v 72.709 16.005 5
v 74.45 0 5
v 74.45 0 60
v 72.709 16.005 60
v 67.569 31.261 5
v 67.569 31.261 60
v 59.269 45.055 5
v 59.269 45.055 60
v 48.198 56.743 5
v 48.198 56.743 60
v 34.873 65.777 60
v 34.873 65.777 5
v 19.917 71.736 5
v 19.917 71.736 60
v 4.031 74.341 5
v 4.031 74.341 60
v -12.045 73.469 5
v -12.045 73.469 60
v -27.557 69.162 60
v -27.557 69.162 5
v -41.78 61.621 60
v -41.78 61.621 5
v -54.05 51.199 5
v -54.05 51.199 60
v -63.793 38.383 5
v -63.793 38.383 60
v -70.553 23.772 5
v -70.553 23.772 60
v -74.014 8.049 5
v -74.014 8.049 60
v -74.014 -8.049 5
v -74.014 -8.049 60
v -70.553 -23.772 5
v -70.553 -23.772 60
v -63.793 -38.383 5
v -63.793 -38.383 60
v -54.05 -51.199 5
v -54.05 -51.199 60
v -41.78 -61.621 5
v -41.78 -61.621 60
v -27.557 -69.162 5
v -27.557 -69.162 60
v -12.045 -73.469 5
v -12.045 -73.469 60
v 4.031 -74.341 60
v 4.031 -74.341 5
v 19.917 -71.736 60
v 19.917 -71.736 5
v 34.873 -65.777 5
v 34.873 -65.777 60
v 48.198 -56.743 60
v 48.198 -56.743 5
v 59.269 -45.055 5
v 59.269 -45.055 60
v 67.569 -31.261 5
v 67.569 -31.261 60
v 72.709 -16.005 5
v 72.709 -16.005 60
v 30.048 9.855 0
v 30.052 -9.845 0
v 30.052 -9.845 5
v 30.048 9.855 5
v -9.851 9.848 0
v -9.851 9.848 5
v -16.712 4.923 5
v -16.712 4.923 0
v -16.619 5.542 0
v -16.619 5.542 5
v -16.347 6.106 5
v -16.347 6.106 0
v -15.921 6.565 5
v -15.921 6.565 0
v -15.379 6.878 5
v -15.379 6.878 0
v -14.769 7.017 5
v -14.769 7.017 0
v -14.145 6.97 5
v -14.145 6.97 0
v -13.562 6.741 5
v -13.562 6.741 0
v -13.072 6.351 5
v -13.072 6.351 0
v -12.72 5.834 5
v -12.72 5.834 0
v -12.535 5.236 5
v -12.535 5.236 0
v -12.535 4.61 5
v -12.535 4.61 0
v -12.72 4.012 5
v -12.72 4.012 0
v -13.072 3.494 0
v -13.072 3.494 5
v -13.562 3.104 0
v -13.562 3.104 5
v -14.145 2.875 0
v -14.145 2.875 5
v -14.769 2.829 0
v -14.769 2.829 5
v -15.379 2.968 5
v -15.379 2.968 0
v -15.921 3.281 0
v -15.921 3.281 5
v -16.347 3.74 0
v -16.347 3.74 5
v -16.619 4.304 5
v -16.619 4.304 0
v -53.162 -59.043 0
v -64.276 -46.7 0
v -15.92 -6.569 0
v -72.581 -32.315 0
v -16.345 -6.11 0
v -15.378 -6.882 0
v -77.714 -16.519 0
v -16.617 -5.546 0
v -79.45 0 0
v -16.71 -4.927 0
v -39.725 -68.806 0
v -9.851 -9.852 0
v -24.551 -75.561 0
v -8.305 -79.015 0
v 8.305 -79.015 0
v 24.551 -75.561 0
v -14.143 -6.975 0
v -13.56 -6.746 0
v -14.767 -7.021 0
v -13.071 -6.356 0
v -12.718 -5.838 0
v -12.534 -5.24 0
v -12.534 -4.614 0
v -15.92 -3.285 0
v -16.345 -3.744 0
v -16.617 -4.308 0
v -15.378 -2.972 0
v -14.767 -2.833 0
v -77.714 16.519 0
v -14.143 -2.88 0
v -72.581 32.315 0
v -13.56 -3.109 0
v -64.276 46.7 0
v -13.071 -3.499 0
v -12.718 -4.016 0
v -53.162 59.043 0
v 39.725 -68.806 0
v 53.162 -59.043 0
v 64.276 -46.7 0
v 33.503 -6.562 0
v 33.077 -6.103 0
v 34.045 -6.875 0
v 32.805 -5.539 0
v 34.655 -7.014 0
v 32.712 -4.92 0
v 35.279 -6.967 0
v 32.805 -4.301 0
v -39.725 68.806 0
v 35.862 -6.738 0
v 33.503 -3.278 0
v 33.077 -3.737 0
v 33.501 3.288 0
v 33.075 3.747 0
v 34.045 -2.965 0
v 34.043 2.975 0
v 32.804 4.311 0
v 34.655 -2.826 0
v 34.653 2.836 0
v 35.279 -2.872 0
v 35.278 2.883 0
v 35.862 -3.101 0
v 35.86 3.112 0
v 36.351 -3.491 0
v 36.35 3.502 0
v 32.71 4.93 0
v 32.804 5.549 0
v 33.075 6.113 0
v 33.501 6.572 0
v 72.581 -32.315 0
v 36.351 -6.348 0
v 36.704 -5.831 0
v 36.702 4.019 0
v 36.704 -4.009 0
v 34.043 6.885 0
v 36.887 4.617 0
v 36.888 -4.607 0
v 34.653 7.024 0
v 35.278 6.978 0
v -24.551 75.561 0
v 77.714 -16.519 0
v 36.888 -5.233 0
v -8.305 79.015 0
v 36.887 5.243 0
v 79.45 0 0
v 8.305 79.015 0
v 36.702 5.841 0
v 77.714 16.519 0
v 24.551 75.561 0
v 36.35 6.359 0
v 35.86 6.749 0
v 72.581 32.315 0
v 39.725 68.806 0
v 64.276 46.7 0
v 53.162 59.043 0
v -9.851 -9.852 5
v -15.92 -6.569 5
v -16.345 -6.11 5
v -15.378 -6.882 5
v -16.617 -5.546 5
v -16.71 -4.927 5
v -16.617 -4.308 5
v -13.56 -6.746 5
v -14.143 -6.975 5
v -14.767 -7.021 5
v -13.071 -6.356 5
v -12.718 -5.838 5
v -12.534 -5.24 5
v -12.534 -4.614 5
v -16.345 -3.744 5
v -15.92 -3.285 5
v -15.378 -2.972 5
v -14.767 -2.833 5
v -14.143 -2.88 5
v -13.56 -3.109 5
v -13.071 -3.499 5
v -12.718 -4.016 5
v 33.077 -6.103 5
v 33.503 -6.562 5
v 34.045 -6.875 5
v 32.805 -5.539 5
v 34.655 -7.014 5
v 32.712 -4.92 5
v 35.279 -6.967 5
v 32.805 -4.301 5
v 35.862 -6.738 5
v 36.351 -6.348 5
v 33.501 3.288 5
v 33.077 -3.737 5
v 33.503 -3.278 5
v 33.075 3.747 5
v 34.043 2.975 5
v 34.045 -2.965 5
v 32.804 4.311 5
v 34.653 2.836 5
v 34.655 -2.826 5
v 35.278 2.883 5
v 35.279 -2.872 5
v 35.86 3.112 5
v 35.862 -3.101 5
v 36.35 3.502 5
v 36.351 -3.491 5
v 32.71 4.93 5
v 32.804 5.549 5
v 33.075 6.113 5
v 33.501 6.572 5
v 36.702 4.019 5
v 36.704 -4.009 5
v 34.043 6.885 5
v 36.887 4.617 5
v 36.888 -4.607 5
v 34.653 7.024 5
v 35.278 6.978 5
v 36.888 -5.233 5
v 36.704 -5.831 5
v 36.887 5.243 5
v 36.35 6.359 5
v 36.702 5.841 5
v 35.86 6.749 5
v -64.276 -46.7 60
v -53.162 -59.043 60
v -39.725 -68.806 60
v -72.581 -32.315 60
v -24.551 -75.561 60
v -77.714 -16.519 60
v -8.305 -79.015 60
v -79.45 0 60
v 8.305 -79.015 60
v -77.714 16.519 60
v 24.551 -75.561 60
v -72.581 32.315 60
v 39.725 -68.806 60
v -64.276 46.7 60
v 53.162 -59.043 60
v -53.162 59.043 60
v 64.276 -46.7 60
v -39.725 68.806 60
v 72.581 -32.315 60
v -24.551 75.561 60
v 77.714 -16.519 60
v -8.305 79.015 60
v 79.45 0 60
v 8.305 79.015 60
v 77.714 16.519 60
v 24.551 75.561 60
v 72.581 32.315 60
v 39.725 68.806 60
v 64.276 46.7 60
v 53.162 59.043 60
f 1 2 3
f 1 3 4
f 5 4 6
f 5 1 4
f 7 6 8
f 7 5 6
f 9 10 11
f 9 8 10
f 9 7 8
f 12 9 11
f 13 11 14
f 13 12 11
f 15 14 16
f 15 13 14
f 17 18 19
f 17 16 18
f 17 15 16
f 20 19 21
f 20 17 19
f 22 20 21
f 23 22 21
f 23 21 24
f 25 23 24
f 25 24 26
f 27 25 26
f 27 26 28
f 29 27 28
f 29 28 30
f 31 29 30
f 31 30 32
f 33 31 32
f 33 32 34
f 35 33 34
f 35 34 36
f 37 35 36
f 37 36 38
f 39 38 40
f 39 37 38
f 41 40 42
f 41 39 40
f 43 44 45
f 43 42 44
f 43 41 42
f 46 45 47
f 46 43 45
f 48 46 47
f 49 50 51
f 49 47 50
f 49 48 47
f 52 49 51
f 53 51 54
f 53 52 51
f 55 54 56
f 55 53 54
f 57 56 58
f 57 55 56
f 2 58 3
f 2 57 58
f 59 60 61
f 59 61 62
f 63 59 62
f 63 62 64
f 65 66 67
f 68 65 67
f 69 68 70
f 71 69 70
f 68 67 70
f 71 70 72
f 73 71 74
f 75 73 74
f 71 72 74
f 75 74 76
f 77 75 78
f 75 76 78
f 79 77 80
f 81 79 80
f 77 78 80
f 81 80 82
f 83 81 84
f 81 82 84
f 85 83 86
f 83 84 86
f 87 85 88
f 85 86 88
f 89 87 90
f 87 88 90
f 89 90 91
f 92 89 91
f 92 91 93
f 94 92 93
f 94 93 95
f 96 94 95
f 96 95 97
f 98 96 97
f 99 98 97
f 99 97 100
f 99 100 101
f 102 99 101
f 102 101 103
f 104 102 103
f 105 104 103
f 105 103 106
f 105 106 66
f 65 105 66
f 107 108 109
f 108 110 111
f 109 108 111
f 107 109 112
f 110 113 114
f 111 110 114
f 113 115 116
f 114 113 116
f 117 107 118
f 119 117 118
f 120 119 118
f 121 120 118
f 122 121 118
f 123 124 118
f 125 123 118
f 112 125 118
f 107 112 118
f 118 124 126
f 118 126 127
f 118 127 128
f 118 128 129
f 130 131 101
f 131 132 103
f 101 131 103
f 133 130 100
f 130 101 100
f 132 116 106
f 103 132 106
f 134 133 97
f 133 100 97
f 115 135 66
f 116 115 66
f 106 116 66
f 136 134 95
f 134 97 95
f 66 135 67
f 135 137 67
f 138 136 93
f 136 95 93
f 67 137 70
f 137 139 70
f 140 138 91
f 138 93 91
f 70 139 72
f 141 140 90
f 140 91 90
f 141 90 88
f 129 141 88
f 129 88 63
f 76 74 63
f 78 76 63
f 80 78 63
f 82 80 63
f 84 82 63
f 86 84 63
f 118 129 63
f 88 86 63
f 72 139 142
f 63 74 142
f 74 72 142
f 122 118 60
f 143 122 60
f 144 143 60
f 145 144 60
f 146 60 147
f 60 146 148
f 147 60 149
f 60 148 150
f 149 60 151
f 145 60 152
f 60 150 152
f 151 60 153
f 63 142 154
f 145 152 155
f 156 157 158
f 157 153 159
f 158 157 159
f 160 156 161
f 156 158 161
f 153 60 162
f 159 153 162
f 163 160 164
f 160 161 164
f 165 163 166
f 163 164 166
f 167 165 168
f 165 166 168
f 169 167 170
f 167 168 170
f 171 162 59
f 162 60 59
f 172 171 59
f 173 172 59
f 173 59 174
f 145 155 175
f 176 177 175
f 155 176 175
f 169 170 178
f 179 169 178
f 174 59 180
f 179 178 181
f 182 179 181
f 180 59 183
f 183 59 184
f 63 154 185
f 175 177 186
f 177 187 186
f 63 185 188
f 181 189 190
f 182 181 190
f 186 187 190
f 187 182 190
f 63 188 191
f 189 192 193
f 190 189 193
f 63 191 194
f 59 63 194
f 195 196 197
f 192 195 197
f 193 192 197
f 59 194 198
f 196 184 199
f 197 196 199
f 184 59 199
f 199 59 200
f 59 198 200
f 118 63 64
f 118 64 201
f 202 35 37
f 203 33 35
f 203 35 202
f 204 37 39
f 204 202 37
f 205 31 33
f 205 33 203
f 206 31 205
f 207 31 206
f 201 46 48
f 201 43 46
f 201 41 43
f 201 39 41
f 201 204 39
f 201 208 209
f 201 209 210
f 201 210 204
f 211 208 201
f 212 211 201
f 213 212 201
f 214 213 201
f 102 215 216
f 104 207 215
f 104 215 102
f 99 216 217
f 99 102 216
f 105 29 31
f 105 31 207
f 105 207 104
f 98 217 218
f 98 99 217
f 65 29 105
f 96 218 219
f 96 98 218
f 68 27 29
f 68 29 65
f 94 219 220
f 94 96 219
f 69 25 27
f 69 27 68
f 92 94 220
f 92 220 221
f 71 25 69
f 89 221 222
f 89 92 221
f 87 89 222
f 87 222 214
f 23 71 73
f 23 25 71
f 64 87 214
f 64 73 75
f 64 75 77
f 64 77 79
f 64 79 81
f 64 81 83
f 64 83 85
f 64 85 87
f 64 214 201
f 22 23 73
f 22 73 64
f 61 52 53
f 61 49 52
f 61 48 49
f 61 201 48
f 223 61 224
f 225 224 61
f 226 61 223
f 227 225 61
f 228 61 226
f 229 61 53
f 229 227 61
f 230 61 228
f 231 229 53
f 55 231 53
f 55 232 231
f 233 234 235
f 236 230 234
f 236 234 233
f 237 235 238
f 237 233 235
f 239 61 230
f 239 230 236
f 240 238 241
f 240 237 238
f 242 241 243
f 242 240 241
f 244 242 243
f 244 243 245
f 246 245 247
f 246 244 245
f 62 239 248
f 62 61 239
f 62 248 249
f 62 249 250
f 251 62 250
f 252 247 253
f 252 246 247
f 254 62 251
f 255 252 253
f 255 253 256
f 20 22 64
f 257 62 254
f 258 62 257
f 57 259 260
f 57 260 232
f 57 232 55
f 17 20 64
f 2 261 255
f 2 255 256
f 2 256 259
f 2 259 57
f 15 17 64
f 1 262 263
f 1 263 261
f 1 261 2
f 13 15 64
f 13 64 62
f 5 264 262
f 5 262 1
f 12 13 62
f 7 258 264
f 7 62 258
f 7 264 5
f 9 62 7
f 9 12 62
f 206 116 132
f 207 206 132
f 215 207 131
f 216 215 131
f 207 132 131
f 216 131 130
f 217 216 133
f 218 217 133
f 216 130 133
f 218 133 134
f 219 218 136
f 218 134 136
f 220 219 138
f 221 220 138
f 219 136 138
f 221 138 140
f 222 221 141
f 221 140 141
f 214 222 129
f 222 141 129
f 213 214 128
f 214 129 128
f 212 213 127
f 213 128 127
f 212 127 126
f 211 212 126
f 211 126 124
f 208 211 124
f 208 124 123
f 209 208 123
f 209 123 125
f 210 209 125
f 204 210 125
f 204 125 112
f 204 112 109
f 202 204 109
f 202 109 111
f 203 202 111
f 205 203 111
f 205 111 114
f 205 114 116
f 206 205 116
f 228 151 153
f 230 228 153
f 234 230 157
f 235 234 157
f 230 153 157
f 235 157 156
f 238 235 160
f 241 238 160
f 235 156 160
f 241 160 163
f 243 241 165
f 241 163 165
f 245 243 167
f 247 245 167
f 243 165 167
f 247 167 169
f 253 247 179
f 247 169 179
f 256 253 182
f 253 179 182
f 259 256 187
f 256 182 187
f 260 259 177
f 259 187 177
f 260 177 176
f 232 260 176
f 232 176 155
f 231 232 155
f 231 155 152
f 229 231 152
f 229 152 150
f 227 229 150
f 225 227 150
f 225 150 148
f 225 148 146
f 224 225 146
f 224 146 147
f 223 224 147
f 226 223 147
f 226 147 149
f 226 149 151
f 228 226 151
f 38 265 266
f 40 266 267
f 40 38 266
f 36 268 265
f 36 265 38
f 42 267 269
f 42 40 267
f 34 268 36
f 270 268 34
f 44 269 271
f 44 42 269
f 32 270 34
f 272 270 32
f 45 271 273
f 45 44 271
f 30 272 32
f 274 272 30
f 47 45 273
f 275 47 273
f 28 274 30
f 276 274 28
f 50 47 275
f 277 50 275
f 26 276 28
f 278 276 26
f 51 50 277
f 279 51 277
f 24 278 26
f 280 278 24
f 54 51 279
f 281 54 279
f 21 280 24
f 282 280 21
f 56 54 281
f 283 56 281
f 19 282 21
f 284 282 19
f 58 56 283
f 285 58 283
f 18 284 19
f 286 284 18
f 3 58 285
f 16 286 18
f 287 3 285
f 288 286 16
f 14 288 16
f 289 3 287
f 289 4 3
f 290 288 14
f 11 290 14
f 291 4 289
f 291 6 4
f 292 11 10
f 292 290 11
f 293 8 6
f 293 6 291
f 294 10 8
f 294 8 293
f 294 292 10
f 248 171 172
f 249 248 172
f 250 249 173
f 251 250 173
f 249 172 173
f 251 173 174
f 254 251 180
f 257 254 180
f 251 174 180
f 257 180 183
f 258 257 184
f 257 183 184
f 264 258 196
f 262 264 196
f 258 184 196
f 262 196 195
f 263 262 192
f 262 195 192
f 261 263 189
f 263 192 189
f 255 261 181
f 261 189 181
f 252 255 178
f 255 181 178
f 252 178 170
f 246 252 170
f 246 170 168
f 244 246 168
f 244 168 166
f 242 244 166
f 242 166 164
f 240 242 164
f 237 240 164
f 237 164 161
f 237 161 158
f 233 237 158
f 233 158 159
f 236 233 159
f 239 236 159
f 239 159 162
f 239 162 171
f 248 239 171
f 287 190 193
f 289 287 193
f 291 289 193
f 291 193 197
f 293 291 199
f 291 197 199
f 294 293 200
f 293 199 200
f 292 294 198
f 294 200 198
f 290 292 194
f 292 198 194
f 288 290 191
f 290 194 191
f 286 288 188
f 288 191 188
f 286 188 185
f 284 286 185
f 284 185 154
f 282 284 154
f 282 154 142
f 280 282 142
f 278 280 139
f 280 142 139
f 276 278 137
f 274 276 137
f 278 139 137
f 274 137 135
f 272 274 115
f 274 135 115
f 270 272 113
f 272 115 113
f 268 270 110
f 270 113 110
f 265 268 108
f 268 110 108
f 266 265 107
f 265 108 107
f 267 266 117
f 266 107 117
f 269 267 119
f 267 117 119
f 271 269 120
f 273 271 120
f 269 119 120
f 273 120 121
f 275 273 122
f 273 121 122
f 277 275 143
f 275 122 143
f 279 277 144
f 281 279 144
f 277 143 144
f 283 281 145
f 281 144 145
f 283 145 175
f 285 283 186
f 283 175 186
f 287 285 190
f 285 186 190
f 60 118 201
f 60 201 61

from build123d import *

# Parameters (mm, degrees)
SKETCH1_R           = 79.45
BOSS_EXTRUDE1_DEPTH = 60
SHELL1_T            = -5
SKETCH2_R           = 2.5
CUT_EXTRUDE1_DEPTH  = 60
SKETCH3_R           = 2.1
CUT_EXTRUDE2_DEPTH  = 60


with BuildPart() as part:
    # Sketch1 → Boss-Extrude1 (new body)
    with BuildSketch(Plane.XY):
        Circle(SKETCH1_R)
    extrude(amount=BOSS_EXTRUDE1_DEPTH)

    # Shell1
    shell1_openings = [part.faces().sort_by_distance(p)[0] for p in [
        (0, 0, 60),
    ]]
    offset(amount=SHELL1_T, openings=shell1_openings, kind=Kind.INTERSECTION)

    # Sketch2 → Cut-Extrude1 (cut)
    with BuildSketch(Plane.XY.offset(5)):
        Circle(SKETCH2_R)
    extrude(amount=-CUT_EXTRUDE1_DEPTH, mode=Mode.SUBTRACT)

    # Sketch3 → Cut-Extrude2 (cut)
    with BuildSketch(Plane(origin=(0, 0, 0), x_dir=(-1, 0, 0), z_dir=(0, 0, -1))):
        with Locations((-34.810395013, 4.930302556)):
            Circle(SKETCH3_R)
        with Locations((-34.811895415, -4.91969733)):
            Circle(SKETCH3_R)
        with Locations((14.610395247, -4.927225588)):
            Circle(SKETCH3_R)
        with Locations((14.61189565, 4.922774298)):
            Circle(SKETCH3_R)
        Polygon((-30.048499249, 9.854577256), (9.851454591, 9.84849949), (9.851454591, -9.851500739), (-30.051500054, -9.845422515), align=None)
    extrude(amount=-CUT_EXTRUDE2_DEPTH, mode=Mode.SUBTRACT)


solid = part.part
